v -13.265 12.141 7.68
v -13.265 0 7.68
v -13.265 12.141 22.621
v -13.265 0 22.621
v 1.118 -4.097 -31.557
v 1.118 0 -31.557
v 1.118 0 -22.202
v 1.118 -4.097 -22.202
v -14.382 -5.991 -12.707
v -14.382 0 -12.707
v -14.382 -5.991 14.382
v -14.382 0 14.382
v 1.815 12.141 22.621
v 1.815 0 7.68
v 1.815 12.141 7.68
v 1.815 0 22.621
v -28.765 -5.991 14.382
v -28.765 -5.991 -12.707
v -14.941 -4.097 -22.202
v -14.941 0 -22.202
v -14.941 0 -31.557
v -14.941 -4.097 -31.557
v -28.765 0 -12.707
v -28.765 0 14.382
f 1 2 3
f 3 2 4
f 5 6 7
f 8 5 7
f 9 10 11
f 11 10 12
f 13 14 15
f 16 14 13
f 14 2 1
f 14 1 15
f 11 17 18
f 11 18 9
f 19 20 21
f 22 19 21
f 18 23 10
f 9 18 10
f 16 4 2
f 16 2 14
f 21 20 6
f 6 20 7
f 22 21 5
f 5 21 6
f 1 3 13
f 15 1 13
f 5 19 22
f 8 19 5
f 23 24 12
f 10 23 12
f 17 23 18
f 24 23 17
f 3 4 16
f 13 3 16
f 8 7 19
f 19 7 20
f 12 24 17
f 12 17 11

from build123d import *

# Parameters (mm, degrees)
F1_DEPTH = 4.09679
F2_W     = 15.080418
F2_H     = 14.940785
F4_DEPTH = 12.14063
F3_W     = 14.382251
F3_H     = 27.088901
F5_DEPTH = 5.99094
F6_W     = 3.21157
F6_H     = 3.071938
F7_DEPTH = 4.03607


with BuildPart() as f1:
    # F0 (on Front) → F1 (new body)
    with BuildSketch(Plane.XZ):
        Polygon((1.118124, -22.201728), (0, -22.201728), (-13.684084, -22.201728), (-14.940785, -22.201728), (-14.940785, -31.557173), (1.118124, -31.557173), align=None)
    extrude(amount=F1_DEPTH)

    # F6 (on Front) → F7 (join)
    with BuildSketch(Plane.XZ):
        with Locations((-3.141754, -25.692567)):
            Rectangle(F6_W, F6_H)
    extrude(amount=F7_DEPTH)


with BuildPart() as f4:
    # F2 (on Front) → F4 (new body)
    with BuildSketch(Plane.XZ):
        with Locations((-5.724974, 15.150236)):
            Rectangle(F2_W, F2_H)
    extrude(amount=-F4_DEPTH)


with BuildPart() as f5:
    # F3 (on Front) → F5 (new body)
    with BuildSketch(Plane.XZ):
        with Locations((-21.573377, 0.837802)):
            Rectangle(F3_W, F3_H)
    extrude(amount=F5_DEPTH)


solid = Compound([f1.part, f4.part, f5.part])
